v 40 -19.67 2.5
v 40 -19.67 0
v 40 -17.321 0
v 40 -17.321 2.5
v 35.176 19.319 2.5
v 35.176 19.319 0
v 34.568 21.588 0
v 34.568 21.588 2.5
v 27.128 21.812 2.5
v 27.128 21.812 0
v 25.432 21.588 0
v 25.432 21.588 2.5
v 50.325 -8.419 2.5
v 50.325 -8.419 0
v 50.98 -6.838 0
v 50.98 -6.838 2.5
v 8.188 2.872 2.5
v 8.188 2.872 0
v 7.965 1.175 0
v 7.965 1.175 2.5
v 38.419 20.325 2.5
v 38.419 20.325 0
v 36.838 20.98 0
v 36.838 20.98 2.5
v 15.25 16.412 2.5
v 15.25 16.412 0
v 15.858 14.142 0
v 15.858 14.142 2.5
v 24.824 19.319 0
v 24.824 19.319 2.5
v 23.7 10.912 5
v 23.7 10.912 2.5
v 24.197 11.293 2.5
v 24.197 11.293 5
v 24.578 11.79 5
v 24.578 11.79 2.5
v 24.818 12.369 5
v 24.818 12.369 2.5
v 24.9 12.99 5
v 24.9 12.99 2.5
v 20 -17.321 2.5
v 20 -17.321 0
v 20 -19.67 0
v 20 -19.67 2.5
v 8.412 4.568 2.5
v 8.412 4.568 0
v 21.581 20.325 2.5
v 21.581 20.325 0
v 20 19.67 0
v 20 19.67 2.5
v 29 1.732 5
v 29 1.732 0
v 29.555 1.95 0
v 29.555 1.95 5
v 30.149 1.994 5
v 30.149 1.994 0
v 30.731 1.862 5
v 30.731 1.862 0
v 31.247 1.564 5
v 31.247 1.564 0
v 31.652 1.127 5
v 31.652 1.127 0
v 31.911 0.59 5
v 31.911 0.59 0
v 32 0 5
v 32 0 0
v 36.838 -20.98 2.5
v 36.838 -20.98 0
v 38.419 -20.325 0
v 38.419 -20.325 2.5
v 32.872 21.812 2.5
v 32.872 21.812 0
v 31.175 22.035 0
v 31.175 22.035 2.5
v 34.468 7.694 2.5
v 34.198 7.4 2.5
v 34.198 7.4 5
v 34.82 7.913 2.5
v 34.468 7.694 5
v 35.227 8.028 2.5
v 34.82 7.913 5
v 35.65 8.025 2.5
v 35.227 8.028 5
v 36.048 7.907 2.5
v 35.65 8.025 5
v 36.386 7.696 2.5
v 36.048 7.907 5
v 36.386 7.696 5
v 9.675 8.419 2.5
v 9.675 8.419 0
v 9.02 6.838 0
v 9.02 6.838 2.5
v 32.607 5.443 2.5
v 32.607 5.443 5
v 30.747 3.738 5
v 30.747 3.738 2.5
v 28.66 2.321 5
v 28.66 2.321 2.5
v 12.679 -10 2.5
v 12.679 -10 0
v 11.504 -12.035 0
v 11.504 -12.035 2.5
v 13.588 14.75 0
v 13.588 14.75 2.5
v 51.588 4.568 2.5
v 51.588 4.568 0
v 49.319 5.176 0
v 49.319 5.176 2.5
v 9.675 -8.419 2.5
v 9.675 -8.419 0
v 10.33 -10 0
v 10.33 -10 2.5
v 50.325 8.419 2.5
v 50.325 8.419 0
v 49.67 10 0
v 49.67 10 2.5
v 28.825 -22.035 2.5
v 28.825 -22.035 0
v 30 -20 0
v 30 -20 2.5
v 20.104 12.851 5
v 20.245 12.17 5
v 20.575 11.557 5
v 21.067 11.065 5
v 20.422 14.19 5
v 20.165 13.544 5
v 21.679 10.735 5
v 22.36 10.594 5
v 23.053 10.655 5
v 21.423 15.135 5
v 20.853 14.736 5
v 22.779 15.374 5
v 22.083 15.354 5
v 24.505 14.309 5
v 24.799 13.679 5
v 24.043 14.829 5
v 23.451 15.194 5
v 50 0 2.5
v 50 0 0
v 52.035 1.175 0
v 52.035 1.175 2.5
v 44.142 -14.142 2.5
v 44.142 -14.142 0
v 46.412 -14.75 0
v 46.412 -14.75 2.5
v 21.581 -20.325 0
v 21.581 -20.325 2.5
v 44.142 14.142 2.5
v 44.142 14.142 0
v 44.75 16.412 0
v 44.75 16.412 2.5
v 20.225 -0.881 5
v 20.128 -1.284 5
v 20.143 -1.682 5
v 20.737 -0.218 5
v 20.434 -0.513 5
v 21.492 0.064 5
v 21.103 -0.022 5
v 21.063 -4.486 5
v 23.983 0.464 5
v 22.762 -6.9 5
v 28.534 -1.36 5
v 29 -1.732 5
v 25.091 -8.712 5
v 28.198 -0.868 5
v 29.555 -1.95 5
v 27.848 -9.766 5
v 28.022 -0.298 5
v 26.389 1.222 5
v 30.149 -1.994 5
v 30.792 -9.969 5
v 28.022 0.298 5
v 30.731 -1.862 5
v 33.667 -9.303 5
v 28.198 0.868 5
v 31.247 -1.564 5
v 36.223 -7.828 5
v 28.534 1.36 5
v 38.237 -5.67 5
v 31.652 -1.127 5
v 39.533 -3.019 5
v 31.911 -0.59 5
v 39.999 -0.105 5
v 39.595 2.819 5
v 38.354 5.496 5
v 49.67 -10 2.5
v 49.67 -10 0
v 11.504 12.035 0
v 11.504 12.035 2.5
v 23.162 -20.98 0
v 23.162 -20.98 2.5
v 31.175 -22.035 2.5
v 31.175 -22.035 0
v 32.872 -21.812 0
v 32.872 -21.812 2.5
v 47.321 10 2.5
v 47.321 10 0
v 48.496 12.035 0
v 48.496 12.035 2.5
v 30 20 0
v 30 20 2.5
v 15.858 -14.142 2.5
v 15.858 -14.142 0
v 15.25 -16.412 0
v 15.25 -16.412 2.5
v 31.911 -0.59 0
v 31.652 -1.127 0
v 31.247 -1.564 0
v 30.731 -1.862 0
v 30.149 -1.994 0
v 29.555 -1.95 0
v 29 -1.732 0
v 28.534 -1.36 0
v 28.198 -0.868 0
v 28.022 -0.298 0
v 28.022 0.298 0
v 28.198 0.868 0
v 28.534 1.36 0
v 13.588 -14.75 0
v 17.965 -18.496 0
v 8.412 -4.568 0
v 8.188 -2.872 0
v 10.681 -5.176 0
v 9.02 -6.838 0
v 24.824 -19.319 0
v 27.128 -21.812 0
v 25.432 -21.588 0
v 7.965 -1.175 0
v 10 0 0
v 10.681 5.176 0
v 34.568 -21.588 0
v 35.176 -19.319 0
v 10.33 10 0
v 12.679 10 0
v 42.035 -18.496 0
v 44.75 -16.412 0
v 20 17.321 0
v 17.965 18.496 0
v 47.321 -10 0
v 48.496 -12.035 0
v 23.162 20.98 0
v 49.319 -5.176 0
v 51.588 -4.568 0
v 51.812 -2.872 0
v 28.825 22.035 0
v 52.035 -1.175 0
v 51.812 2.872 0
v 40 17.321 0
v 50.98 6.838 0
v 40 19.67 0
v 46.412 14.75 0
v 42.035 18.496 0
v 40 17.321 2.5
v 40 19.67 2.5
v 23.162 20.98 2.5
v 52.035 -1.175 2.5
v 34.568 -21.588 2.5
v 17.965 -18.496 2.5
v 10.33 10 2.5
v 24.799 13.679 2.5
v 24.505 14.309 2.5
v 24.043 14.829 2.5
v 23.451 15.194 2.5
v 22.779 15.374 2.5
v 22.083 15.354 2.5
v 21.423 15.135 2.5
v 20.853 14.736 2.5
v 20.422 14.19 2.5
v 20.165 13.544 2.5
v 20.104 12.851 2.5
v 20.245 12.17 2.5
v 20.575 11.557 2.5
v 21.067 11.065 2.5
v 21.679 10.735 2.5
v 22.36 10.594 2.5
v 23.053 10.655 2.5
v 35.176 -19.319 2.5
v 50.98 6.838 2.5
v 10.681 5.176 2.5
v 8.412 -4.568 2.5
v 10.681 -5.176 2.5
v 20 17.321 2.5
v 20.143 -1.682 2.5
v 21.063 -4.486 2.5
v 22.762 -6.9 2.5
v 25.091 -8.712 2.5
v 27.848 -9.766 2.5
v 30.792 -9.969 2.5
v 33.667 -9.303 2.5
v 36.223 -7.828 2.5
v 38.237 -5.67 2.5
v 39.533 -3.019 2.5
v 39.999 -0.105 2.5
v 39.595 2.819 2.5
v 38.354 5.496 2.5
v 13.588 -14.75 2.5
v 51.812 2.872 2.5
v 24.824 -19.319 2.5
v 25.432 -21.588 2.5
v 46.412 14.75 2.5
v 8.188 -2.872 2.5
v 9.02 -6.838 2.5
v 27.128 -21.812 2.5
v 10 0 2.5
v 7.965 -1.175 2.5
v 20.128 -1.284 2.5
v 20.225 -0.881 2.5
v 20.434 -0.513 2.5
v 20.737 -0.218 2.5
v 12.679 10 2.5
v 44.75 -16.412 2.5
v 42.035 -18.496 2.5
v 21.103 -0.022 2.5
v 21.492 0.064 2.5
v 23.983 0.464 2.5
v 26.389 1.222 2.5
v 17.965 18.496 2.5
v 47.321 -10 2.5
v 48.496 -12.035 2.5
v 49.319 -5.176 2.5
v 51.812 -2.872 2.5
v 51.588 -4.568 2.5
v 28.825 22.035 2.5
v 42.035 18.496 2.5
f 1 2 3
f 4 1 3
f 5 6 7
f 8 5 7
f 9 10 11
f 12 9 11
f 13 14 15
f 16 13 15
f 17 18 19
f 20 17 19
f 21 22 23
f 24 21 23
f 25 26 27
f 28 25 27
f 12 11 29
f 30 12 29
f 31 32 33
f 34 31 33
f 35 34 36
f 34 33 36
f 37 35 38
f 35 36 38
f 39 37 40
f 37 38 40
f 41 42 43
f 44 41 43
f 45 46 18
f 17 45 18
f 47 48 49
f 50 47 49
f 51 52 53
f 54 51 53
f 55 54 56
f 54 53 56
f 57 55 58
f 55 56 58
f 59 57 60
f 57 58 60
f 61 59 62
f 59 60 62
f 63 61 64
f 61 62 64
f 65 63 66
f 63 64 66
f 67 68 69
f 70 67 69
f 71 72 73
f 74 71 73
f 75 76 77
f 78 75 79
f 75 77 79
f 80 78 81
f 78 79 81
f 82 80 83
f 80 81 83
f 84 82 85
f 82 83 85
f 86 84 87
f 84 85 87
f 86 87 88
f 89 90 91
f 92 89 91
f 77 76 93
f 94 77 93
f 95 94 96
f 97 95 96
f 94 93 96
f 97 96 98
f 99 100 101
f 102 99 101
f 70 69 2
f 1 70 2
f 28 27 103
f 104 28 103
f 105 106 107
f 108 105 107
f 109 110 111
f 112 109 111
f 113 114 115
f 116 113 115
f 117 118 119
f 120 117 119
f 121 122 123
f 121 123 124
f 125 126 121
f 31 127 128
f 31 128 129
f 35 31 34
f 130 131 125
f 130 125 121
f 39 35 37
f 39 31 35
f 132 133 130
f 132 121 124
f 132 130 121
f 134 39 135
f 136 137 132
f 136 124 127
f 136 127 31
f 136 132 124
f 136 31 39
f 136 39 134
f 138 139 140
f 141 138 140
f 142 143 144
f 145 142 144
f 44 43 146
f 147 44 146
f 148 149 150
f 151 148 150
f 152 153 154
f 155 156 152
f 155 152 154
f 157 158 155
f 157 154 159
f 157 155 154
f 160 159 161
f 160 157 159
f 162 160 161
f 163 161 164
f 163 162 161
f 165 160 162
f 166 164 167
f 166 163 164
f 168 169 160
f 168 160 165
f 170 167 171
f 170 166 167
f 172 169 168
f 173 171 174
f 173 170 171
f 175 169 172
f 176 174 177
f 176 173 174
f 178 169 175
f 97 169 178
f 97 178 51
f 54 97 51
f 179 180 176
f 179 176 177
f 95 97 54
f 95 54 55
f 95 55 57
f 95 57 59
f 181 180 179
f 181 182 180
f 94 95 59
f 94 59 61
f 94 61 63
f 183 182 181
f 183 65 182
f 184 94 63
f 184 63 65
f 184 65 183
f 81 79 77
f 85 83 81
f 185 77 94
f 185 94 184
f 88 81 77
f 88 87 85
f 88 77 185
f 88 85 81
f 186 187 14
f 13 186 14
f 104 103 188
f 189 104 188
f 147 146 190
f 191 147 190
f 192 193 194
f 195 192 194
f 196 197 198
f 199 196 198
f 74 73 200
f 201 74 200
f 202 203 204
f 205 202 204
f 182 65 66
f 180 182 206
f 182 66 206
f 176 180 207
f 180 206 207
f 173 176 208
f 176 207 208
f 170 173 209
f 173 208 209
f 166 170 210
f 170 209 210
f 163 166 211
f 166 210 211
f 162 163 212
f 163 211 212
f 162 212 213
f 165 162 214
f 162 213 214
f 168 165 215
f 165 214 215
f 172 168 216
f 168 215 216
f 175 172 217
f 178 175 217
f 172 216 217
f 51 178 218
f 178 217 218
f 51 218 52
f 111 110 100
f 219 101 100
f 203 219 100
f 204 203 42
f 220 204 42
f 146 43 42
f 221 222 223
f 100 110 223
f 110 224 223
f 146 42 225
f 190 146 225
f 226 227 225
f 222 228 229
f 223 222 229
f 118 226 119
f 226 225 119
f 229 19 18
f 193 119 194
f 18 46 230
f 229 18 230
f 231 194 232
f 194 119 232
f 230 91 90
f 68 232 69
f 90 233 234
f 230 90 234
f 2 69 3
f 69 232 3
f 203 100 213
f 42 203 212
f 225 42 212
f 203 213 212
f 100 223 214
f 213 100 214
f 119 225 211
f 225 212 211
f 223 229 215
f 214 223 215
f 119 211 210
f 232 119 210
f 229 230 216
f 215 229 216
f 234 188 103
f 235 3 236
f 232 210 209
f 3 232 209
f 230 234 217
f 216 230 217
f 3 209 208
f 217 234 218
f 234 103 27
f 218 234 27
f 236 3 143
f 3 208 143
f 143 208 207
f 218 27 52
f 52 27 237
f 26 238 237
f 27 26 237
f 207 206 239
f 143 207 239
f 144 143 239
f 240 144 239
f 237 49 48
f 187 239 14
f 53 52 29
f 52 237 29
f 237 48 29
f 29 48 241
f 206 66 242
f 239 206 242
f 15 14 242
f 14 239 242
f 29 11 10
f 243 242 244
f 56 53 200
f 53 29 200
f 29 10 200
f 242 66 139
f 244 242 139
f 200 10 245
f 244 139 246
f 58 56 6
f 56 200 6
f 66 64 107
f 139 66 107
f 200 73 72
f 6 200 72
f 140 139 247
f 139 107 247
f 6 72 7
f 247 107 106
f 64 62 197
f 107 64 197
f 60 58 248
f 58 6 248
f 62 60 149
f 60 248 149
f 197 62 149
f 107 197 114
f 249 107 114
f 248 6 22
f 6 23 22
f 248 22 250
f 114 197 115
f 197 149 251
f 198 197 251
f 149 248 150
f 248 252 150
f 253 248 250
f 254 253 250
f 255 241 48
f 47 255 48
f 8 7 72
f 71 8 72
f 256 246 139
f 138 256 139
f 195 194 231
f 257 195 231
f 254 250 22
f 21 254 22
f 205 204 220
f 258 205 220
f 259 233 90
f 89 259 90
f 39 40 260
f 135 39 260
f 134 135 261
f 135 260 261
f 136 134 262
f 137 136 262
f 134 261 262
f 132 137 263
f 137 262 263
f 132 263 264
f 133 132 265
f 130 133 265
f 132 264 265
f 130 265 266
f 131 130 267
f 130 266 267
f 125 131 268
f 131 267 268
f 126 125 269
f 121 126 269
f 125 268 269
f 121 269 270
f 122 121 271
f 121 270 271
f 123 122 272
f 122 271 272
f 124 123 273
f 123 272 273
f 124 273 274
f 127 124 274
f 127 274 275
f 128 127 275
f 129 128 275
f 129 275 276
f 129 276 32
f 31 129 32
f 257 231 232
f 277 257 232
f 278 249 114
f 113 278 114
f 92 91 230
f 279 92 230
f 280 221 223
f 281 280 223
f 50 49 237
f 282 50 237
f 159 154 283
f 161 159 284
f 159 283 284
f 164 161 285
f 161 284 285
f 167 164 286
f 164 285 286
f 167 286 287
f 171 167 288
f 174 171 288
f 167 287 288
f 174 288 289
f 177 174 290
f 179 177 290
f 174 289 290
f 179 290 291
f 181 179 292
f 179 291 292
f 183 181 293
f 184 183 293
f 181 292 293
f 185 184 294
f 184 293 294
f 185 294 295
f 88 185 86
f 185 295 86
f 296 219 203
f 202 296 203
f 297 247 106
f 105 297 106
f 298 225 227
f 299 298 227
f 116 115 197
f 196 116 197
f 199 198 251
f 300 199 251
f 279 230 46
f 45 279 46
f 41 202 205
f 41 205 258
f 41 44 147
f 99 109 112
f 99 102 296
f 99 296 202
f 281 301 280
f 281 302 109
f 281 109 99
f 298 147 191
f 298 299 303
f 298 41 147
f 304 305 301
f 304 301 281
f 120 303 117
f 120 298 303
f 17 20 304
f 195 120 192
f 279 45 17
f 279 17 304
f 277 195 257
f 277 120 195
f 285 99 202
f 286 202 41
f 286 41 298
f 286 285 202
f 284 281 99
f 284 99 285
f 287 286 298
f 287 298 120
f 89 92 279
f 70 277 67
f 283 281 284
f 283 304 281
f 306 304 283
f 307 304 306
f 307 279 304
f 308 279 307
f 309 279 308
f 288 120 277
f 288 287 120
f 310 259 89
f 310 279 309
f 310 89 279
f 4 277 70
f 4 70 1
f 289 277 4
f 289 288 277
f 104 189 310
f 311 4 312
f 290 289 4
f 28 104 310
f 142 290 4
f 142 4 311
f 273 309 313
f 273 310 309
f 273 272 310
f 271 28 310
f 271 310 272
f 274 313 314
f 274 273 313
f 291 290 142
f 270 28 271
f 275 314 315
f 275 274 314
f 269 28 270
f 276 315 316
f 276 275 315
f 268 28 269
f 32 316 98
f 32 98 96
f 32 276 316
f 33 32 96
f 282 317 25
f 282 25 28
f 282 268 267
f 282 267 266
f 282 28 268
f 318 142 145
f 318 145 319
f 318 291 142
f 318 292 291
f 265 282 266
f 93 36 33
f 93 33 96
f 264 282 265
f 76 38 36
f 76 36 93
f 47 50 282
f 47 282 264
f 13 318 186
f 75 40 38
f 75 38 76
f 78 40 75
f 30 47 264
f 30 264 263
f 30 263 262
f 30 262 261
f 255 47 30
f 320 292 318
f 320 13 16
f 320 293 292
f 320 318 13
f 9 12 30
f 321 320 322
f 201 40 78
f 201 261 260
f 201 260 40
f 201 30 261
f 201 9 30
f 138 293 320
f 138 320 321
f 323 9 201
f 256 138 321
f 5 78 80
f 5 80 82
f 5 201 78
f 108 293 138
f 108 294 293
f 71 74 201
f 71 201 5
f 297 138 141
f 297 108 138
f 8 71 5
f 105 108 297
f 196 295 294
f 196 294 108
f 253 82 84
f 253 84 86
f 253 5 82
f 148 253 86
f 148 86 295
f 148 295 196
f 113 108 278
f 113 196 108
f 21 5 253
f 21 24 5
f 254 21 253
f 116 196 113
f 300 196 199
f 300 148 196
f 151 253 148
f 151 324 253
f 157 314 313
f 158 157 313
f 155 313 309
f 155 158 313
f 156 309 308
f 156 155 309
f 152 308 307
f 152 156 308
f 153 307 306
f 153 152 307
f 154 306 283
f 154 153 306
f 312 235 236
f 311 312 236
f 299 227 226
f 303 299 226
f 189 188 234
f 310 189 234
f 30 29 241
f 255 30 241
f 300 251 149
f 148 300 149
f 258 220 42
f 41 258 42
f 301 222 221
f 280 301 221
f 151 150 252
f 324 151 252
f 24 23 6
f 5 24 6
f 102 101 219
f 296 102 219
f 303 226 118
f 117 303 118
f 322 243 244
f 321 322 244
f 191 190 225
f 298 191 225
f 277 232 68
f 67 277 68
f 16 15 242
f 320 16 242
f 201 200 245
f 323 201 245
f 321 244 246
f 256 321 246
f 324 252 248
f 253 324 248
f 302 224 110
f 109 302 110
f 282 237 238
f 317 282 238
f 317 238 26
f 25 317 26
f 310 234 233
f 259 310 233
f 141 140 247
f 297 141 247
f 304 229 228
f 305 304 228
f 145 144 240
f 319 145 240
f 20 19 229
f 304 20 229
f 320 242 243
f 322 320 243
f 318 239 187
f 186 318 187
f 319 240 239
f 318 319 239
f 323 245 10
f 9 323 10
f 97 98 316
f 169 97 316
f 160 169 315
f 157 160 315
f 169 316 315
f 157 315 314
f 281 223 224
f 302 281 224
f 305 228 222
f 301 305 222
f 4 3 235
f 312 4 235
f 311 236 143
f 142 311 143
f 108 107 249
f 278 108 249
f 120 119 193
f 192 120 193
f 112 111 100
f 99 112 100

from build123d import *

# Parameters (mm, degrees)
F0_R     = 20
F2_DEPTH = 2.5
F3_DEPTH = 5
F4_DEPTH = 2.5
F5_R     = 1.5


with BuildPart() as f2:
    # F0 (on Top) → F2 (new body)
    with BuildSketch(Plane.XY):
        with Locations((30, 0)):
            Circle(F0_R)
        with BuildLine():
            ThreePointArc((20, 0), (24.4828773608, 0.5901820009), (28.6602540378, 2.3205080757))
            ThreePointArc((28.6602540378, 2.3205080757), (32.2474487139, 5.0730593618), (35, 8.6602540378))
            ThreePointArc((35, 8.6602540378), (35, -8.6602540378), (20, 0))
        make_face(mode=Mode.SUBTRACT)
        with BuildLine():
            ThreePointArc((24.9, 12.9903810568), (24.5784609691, 11.7903810568), (23.7, 10.9119200877))
            ThreePointArc((23.7, 10.9119200877), (20.4215390309, 14.1903810568), (24.9, 12.9903810568))
        make_face(mode=Mode.SUBTRACT)
    extrude(amount=F2_DEPTH)

    # F0 (on Top) → F3 (join)
    with BuildSketch(Plane.XY):
        with BuildLine():
            ThreePointArc((24.9, 12.9903810568), (20.4215390309, 14.1903810568), (23.7, 10.9119200877))
            ThreePointArc((23.7, 10.9119200877), (24.5784609691, 11.7903810568), (24.9, 12.9903810568))
        make_face()
        with BuildLine():
            ThreePointArc((35, 8.6602540378), (32.2474487139, 5.0730593618), (28.6602540378, 2.3205080757))
            ThreePointArc((28.6602540378, 2.3205080757), (24.4828773608, 0.5901820009), (20, 0))
            ThreePointArc((20, 0), (35, -8.6602540378), (35, 8.6602540378))
        make_face()
        with BuildLine():
            ThreePointArc((32, 0), (29, -1.7320508076), (29, 1.7320508076))
            ThreePointArc((29, 1.7320508076), (31, 1.7320508076), (32, 0))
        make_face(mode=Mode.SUBTRACT)
    extrude(amount=F3_DEPTH)

    # F1 (on Top) → F4 (join)
    with BuildSketch(Plane.XY):
        with BuildLine():
            Line((31.1749923535, 22.0351464548), (30, 20))
            ThreePointArc((30, 20), (32.6105238444, 19.8288972275), (35.1763809021, 19.3185165258))
            Line((35.1763809021, 19.3185165258), (34.5681601042, 21.5884274457))
            Line((34.5681601042, 21.5884274457), (32.8715762288, 21.8117869502))
            Line((32.8715762288, 21.8117869502), (31.1749923535, 22.0351464548))
        make_face()
        with BuildLine():
            Line((7.9648535452, 1.1749923535), (10, 0))
            Line((10, 0), (7.9648535452, -1.1749923535))
            Line((7.9648535452, -1.1749923535), (8.1882130498, -2.8715762288))
            Line((8.1882130498, -2.8715762288), (8.4115725543, -4.5681601042))
            Line((8.4115725543, -4.5681601042), (10.6814834742, -5.1763809021))
            Line((10.6814834742, -5.1763809021), (9.0197933522, -6.8380710241))
            Line((9.0197933522, -6.8380710241), (9.6746502848, -8.419035512))
            Line((9.6746502848, -8.419035512), (10.3295072173, -10))
            Line((10.3295072173, -10), (12.6794919243, -10))
            Line((12.6794919243, -10), (11.5044995708, -12.0351464548))
            Line((11.5044995708, -12.0351464548), (12.5462265136, -13.3927514382))
            Line((12.5462265136, -13.3927514382), (13.5879534564, -14.7503564216))
            Line((13.5879534564, -14.7503564216), (15.8578643763, -14.1421356237))
            Line((15.8578643763, -14.1421356237), (15.2496435784, -16.4120465436))
            Line((15.2496435784, -16.4120465436), (16.6072485618, -17.4537734864))
            Line((16.6072485618, -17.4537734864), (17.9648535452, -18.4955004292))
            Line((17.9648535452, -18.4955004292), (20, -17.3205080757))
            Line((20, -17.3205080757), (20, -19.6704927827))
            Line((20, -19.6704927827), (21.580964488, -20.3253497152))
            Line((21.580964488, -20.3253497152), (23.1619289759, -20.9802066478))
            Line((23.1619289759, -20.9802066478), (24.8236190979, -19.3185165258))
            Line((24.8236190979, -19.3185165258), (25.4318398958, -21.5884274457))
            Line((25.4318398958, -21.5884274457), (27.1284237712, -21.8117869502))
            Line((27.1284237712, -21.8117869502), (28.8250076465, -22.0351464548))
            Line((28.8250076465, -22.0351464548), (30, -20))
            Line((30, -20), (31.1749923535, -22.0351464548))
            Line((31.1749923535, -22.0351464548), (32.8715762288, -21.8117869502))
            Line((32.8715762288, -21.8117869502), (34.5681601042, -21.5884274457))
            Line((34.5681601042, -21.5884274457), (35.1763809021, -19.3185165258))
            Line((35.1763809021, -19.3185165258), (36.8380710241, -20.9802066478))
            Line((36.8380710241, -20.9802066478), (38.419035512, -20.3253497152))
            Line((38.419035512, -20.3253497152), (40, -19.6704927827))
            Line((40, -19.6704927827), (40, -17.3205080757))
            Line((40, -17.3205080757), (42.0351464548, -18.4955004292))
            Line((42.0351464548, -18.4955004292), (43.3927514382, -17.4537734864))
            Line((43.3927514382, -17.4537734864), (44.7503564216, -16.4120465436))
            Line((44.7503564216, -16.4120465436), (44.1421356237, -14.1421356237))
            Line((44.1421356237, -14.1421356237), (46.4120465436, -14.7503564216))
            Line((46.4120465436, -14.7503564216), (47.4537734864, -13.3927514382))
            Line((47.4537734864, -13.3927514382), (48.4955004292, -12.0351464548))
            Line((48.4955004292, -12.0351464548), (47.3205080757, -10))
            Line((47.3205080757, -10), (49.6704927827, -10))
            Line((49.6704927827, -10), (50.3253497152, -8.419035512))
            Line((50.3253497152, -8.419035512), (50.9802066478, -6.8380710241))
            Line((50.9802066478, -6.8380710241), (49.3185165258, -5.1763809021))
            Line((49.3185165258, -5.1763809021), (51.5884274457, -4.5681601042))
            Line((51.5884274457, -4.5681601042), (51.8117869502, -2.8715762288))
            Line((51.8117869502, -2.8715762288), (52.0351464548, -1.1749923535))
            Line((52.0351464548, -1.1749923535), (50, 0))
            Line((50, 0), (52.0351464548, 1.1749923535))
            Line((52.0351464548, 1.1749923535), (51.8117869502, 2.8715762288))
            Line((51.8117869502, 2.8715762288), (51.5884274457, 4.5681601042))
            Line((51.5884274457, 4.5681601042), (49.3185165258, 5.1763809021))
            Line((49.3185165258, 5.1763809021), (50.9802066478, 6.8380710241))
            Line((50.9802066478, 6.8380710241), (50.3253497152, 8.419035512))
            Line((50.3253497152, 8.419035512), (49.6704927827, 10))
            Line((49.6704927827, 10), (47.3205080757, 10))
            Line((47.3205080757, 10), (48.4955004292, 12.0351464548))
            Line((48.4955004292, 12.0351464548), (47.4537734864, 13.3927514382))
            Line((47.4537734864, 13.3927514382), (46.4120465436, 14.7503564216))
            Line((46.4120465436, 14.7503564216), (44.1421356237, 14.1421356237))
            Line((44.1421356237, 14.1421356237), (44.7503564216, 16.4120465436))
            Line((44.7503564216, 16.4120465436), (43.3927514382, 17.4537734864))
            Line((43.3927514382, 17.4537734864), (42.0351464548, 18.4955004292))
            Line((42.0351464548, 18.4955004292), (40, 17.3205080757))
            Line((40, 17.3205080757), (40, 19.6704927827))
            Line((40, 19.6704927827), (38.419035512, 20.3253497152))
            Line((38.419035512, 20.3253497152), (36.8380710241, 20.9802066478))
            Line((36.8380710241, 20.9802066478), (35.1763809021, 19.3185165258))
            ThreePointArc((35.1763809021, 19.3185165258), (32.6105238444, 19.8288972275), (30, 20))
            Line((30, 20), (28.8250076465, 22.0351464548))
            Line((28.8250076465, 22.0351464548), (27.1284237712, 21.8117869502))
            Line((27.1284237712, 21.8117869502), (25.4318398958, 21.5884274457))
            Line((25.4318398958, 21.5884274457), (24.8236190979, 19.3185165258))
            Line((24.8236190979, 19.3185165258), (23.1619289759, 20.9802066478))
            Line((23.1619289759, 20.9802066478), (21.580964488, 20.3253497152))
            Line((21.580964488, 20.3253497152), (20, 19.6704927827))
            Line((20, 19.6704927827), (20, 17.3205080757))
            Line((20, 17.3205080757), (17.9648535452, 18.4955004292))
            Line((17.9648535452, 18.4955004292), (16.6072485618, 17.4537734864))
            Line((16.6072485618, 17.4537734864), (15.2496435784, 16.4120465436))
            Line((15.2496435784, 16.4120465436), (15.8578643763, 14.1421356237))
            Line((15.8578643763, 14.1421356237), (13.5879534564, 14.7503564216))
            Line((13.5879534564, 14.7503564216), (12.5462265136, 13.3927514382))
            Line((12.5462265136, 13.3927514382), (11.5044995708, 12.0351464548))
            Line((11.5044995708, 12.0351464548), (12.6794919243, 10))
            Line((12.6794919243, 10), (10.3295072173, 10))
            Line((10.3295072173, 10), (9.6746502848, 8.419035512))
            Line((9.6746502848, 8.419035512), (9.0197933522, 6.8380710241))
            Line((9.0197933522, 6.8380710241), (10.6814834742, 5.1763809021))
            Line((10.6814834742, 5.1763809021), (8.4115725543, 4.5681601042))
            Line((8.4115725543, 4.5681601042), (8.1882130498, 2.8715762288))
            Line((8.1882130498, 2.8715762288), (7.9648535452, 1.1749923535))
        make_face()
        with BuildLine():
            ThreePointArc((32, 0), (30, -2), (28, 0))
            ThreePointArc((28, 0), (30, 2), (32, 0))
        make_face(mode=Mode.SUBTRACT)
    extrude(amount=F4_DEPTH)

    # F5
    f5_edges = [f2.edges().sort_by_distance(p)[0] for p in [
        (20, 0, 3.75),
        (35, 8.660254, 3.75),
    ]]
    fillet(f5_edges, radius=F5_R)


solid = f2.part
